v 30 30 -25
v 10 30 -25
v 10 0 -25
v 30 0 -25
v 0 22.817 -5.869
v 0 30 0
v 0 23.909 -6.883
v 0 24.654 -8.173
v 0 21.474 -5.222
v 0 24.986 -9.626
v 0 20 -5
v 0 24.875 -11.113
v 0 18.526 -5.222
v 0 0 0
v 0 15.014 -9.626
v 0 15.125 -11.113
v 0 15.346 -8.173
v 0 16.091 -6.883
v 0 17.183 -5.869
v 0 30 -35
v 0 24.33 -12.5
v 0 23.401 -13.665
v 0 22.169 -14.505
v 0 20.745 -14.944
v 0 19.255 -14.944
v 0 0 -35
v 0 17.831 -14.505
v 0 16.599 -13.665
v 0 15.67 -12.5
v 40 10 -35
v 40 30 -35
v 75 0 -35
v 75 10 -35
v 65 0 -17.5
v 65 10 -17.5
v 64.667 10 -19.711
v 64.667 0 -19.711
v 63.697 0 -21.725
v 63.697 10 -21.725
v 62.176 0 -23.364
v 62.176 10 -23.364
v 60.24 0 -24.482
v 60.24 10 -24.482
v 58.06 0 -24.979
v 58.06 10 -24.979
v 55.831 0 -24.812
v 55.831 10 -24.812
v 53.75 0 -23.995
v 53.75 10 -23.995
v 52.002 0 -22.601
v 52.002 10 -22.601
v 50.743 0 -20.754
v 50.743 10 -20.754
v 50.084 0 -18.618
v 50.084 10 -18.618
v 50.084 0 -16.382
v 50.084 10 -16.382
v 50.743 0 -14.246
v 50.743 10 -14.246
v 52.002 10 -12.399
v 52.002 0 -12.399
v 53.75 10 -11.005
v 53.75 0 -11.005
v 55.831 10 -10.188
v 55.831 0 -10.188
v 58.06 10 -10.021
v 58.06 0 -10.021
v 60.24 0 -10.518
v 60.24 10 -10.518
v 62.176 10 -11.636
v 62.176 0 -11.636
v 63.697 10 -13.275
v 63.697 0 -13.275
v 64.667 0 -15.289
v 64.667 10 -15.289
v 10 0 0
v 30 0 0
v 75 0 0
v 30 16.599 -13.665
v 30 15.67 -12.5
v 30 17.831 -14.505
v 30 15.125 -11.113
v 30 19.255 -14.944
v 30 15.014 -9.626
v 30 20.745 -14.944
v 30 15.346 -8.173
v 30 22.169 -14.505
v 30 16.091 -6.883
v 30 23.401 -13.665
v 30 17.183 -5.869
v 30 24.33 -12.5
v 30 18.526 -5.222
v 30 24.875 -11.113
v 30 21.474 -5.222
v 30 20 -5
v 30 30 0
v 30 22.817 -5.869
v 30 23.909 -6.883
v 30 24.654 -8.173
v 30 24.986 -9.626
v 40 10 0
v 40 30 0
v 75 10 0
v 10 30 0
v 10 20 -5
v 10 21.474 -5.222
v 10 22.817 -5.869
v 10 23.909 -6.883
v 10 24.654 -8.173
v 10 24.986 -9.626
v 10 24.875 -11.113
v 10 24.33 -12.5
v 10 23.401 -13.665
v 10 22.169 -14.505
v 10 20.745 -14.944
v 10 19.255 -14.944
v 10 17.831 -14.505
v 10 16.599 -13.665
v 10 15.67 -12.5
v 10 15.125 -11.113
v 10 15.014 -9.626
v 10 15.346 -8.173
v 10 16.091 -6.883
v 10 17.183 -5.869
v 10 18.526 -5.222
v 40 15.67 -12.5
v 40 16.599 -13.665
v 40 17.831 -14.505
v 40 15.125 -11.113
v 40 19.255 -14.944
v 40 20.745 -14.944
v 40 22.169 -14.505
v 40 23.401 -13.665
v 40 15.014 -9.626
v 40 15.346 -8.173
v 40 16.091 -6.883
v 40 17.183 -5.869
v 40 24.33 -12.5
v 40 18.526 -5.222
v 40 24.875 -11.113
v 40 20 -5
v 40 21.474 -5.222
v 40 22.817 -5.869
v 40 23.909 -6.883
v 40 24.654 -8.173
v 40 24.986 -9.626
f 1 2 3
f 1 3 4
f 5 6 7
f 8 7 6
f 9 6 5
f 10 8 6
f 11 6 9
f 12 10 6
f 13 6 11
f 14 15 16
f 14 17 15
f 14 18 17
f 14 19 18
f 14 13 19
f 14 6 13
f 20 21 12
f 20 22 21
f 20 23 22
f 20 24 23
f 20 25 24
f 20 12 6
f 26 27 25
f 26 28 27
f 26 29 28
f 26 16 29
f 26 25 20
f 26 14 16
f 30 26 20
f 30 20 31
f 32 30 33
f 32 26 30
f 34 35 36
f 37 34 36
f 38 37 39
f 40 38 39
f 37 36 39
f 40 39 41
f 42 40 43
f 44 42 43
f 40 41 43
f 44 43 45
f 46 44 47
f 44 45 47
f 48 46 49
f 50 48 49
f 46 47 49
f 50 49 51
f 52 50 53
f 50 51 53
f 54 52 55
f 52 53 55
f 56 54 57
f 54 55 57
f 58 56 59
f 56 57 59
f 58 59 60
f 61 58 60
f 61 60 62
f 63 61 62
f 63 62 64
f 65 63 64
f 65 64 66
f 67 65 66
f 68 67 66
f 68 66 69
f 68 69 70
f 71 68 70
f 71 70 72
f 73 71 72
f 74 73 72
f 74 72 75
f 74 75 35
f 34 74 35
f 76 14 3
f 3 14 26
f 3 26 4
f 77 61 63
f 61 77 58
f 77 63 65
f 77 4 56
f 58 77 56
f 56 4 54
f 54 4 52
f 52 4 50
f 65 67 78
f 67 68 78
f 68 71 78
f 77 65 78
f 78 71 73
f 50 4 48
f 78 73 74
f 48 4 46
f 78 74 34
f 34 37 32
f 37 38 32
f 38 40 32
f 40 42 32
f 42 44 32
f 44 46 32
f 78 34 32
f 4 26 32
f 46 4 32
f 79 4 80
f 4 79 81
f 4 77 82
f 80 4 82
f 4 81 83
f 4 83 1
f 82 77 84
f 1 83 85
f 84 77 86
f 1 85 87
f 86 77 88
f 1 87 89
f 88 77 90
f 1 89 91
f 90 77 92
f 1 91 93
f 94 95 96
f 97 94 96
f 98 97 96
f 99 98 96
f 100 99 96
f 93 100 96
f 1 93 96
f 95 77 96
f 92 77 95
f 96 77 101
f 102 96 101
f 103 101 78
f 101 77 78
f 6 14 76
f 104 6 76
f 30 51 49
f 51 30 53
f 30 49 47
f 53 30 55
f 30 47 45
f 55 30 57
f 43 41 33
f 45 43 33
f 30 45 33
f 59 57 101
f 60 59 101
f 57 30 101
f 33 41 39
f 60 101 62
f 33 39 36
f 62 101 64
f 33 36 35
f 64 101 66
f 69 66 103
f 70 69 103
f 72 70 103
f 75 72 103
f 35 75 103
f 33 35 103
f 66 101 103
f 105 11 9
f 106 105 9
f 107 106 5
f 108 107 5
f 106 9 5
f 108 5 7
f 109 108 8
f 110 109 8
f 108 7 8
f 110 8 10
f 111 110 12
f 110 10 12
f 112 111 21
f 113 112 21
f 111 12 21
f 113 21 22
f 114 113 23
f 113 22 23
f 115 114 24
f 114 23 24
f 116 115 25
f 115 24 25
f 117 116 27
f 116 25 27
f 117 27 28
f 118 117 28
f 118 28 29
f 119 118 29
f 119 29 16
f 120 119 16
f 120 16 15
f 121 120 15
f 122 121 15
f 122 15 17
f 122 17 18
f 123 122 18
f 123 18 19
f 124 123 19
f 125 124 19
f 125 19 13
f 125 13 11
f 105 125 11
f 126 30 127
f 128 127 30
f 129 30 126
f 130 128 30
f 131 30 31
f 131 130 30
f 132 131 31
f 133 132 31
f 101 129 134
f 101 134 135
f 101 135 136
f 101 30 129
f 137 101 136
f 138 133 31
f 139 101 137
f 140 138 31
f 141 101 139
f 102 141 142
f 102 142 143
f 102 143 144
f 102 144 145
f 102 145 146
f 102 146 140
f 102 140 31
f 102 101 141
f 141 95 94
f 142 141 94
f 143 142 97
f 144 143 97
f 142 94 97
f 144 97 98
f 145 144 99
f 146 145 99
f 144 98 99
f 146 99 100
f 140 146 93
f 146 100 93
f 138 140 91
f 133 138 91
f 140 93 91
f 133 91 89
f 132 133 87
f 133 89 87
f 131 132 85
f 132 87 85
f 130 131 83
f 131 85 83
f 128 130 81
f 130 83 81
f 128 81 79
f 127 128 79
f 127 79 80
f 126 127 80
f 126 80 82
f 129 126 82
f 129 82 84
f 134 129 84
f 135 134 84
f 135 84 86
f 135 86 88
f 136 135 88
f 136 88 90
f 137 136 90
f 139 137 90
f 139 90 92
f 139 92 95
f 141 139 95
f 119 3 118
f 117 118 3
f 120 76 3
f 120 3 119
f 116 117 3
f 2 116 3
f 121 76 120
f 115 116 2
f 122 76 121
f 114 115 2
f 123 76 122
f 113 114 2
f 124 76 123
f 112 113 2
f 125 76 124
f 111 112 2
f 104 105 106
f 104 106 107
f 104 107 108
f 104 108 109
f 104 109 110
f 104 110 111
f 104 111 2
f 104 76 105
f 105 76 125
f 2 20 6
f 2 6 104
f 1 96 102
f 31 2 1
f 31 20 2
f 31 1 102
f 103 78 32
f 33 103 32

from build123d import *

# Parameters (mm, degrees)
SKETCH1_W           = 75
SKETCH1_H           = 35
BOSS_EXTRUDE1_DEPTH = 30
SKETCH2_W           = 20
SKETCH2_H           = 30
CUT_EXTRUDE1_DEPTH  = 25
SKETCH3_W           = 35
SKETCH3_H           = 20
CUT_EXTRUDE2_DEPTH  = 36
SKETCH4_R           = 7.5
CUT_EXTRUDE3_DEPTH  = 11
SKETCH5_R           = 5
CUT_EXTRUDE4_DEPTH  = 76


with BuildPart() as part:
    # Sketch1 → Boss-Extrude1 (new body)
    with BuildSketch(Plane(origin=(0, 0, 0), x_dir=(1, 0, 0), z_dir=(0, 1, 0))):
        with Locations((37.5, 17.5)):
            Rectangle(SKETCH1_W, SKETCH1_H)
    extrude(amount=BOSS_EXTRUDE1_DEPTH)

    # Sketch2 → Cut-Extrude1 (cut)
    with BuildSketch(Plane.XY):
        with Locations((20, 15)):
            Rectangle(SKETCH2_W, SKETCH2_H)
    extrude(amount=-CUT_EXTRUDE1_DEPTH, mode=Mode.SUBTRACT)

    # Sketch3 → Cut-Extrude2 (cut, through all)
    with BuildSketch(Plane.XY):
        with Locations((57.5, 20)):
            Rectangle(SKETCH3_W, SKETCH3_H)
    extrude(amount=-CUT_EXTRUDE2_DEPTH, mode=Mode.SUBTRACT)

    # Sketch4 → Cut-Extrude3 (cut, through all)
    with BuildSketch(Plane(origin=(0, 10, 0), x_dir=(1, 0, 0), z_dir=(0, 1, 0))):
        with Locations((57.5, 17.5)):
            Circle(SKETCH4_R)
    extrude(amount=-CUT_EXTRUDE3_DEPTH, mode=Mode.SUBTRACT)

    # Sketch5 → Cut-Extrude4 (cut, through all)
    with BuildSketch(Plane.ZY):
        with Locations((-10, 20)):
            Circle(SKETCH5_R)
    extrude(amount=-CUT_EXTRUDE4_DEPTH, mode=Mode.SUBTRACT)


solid = part.part
